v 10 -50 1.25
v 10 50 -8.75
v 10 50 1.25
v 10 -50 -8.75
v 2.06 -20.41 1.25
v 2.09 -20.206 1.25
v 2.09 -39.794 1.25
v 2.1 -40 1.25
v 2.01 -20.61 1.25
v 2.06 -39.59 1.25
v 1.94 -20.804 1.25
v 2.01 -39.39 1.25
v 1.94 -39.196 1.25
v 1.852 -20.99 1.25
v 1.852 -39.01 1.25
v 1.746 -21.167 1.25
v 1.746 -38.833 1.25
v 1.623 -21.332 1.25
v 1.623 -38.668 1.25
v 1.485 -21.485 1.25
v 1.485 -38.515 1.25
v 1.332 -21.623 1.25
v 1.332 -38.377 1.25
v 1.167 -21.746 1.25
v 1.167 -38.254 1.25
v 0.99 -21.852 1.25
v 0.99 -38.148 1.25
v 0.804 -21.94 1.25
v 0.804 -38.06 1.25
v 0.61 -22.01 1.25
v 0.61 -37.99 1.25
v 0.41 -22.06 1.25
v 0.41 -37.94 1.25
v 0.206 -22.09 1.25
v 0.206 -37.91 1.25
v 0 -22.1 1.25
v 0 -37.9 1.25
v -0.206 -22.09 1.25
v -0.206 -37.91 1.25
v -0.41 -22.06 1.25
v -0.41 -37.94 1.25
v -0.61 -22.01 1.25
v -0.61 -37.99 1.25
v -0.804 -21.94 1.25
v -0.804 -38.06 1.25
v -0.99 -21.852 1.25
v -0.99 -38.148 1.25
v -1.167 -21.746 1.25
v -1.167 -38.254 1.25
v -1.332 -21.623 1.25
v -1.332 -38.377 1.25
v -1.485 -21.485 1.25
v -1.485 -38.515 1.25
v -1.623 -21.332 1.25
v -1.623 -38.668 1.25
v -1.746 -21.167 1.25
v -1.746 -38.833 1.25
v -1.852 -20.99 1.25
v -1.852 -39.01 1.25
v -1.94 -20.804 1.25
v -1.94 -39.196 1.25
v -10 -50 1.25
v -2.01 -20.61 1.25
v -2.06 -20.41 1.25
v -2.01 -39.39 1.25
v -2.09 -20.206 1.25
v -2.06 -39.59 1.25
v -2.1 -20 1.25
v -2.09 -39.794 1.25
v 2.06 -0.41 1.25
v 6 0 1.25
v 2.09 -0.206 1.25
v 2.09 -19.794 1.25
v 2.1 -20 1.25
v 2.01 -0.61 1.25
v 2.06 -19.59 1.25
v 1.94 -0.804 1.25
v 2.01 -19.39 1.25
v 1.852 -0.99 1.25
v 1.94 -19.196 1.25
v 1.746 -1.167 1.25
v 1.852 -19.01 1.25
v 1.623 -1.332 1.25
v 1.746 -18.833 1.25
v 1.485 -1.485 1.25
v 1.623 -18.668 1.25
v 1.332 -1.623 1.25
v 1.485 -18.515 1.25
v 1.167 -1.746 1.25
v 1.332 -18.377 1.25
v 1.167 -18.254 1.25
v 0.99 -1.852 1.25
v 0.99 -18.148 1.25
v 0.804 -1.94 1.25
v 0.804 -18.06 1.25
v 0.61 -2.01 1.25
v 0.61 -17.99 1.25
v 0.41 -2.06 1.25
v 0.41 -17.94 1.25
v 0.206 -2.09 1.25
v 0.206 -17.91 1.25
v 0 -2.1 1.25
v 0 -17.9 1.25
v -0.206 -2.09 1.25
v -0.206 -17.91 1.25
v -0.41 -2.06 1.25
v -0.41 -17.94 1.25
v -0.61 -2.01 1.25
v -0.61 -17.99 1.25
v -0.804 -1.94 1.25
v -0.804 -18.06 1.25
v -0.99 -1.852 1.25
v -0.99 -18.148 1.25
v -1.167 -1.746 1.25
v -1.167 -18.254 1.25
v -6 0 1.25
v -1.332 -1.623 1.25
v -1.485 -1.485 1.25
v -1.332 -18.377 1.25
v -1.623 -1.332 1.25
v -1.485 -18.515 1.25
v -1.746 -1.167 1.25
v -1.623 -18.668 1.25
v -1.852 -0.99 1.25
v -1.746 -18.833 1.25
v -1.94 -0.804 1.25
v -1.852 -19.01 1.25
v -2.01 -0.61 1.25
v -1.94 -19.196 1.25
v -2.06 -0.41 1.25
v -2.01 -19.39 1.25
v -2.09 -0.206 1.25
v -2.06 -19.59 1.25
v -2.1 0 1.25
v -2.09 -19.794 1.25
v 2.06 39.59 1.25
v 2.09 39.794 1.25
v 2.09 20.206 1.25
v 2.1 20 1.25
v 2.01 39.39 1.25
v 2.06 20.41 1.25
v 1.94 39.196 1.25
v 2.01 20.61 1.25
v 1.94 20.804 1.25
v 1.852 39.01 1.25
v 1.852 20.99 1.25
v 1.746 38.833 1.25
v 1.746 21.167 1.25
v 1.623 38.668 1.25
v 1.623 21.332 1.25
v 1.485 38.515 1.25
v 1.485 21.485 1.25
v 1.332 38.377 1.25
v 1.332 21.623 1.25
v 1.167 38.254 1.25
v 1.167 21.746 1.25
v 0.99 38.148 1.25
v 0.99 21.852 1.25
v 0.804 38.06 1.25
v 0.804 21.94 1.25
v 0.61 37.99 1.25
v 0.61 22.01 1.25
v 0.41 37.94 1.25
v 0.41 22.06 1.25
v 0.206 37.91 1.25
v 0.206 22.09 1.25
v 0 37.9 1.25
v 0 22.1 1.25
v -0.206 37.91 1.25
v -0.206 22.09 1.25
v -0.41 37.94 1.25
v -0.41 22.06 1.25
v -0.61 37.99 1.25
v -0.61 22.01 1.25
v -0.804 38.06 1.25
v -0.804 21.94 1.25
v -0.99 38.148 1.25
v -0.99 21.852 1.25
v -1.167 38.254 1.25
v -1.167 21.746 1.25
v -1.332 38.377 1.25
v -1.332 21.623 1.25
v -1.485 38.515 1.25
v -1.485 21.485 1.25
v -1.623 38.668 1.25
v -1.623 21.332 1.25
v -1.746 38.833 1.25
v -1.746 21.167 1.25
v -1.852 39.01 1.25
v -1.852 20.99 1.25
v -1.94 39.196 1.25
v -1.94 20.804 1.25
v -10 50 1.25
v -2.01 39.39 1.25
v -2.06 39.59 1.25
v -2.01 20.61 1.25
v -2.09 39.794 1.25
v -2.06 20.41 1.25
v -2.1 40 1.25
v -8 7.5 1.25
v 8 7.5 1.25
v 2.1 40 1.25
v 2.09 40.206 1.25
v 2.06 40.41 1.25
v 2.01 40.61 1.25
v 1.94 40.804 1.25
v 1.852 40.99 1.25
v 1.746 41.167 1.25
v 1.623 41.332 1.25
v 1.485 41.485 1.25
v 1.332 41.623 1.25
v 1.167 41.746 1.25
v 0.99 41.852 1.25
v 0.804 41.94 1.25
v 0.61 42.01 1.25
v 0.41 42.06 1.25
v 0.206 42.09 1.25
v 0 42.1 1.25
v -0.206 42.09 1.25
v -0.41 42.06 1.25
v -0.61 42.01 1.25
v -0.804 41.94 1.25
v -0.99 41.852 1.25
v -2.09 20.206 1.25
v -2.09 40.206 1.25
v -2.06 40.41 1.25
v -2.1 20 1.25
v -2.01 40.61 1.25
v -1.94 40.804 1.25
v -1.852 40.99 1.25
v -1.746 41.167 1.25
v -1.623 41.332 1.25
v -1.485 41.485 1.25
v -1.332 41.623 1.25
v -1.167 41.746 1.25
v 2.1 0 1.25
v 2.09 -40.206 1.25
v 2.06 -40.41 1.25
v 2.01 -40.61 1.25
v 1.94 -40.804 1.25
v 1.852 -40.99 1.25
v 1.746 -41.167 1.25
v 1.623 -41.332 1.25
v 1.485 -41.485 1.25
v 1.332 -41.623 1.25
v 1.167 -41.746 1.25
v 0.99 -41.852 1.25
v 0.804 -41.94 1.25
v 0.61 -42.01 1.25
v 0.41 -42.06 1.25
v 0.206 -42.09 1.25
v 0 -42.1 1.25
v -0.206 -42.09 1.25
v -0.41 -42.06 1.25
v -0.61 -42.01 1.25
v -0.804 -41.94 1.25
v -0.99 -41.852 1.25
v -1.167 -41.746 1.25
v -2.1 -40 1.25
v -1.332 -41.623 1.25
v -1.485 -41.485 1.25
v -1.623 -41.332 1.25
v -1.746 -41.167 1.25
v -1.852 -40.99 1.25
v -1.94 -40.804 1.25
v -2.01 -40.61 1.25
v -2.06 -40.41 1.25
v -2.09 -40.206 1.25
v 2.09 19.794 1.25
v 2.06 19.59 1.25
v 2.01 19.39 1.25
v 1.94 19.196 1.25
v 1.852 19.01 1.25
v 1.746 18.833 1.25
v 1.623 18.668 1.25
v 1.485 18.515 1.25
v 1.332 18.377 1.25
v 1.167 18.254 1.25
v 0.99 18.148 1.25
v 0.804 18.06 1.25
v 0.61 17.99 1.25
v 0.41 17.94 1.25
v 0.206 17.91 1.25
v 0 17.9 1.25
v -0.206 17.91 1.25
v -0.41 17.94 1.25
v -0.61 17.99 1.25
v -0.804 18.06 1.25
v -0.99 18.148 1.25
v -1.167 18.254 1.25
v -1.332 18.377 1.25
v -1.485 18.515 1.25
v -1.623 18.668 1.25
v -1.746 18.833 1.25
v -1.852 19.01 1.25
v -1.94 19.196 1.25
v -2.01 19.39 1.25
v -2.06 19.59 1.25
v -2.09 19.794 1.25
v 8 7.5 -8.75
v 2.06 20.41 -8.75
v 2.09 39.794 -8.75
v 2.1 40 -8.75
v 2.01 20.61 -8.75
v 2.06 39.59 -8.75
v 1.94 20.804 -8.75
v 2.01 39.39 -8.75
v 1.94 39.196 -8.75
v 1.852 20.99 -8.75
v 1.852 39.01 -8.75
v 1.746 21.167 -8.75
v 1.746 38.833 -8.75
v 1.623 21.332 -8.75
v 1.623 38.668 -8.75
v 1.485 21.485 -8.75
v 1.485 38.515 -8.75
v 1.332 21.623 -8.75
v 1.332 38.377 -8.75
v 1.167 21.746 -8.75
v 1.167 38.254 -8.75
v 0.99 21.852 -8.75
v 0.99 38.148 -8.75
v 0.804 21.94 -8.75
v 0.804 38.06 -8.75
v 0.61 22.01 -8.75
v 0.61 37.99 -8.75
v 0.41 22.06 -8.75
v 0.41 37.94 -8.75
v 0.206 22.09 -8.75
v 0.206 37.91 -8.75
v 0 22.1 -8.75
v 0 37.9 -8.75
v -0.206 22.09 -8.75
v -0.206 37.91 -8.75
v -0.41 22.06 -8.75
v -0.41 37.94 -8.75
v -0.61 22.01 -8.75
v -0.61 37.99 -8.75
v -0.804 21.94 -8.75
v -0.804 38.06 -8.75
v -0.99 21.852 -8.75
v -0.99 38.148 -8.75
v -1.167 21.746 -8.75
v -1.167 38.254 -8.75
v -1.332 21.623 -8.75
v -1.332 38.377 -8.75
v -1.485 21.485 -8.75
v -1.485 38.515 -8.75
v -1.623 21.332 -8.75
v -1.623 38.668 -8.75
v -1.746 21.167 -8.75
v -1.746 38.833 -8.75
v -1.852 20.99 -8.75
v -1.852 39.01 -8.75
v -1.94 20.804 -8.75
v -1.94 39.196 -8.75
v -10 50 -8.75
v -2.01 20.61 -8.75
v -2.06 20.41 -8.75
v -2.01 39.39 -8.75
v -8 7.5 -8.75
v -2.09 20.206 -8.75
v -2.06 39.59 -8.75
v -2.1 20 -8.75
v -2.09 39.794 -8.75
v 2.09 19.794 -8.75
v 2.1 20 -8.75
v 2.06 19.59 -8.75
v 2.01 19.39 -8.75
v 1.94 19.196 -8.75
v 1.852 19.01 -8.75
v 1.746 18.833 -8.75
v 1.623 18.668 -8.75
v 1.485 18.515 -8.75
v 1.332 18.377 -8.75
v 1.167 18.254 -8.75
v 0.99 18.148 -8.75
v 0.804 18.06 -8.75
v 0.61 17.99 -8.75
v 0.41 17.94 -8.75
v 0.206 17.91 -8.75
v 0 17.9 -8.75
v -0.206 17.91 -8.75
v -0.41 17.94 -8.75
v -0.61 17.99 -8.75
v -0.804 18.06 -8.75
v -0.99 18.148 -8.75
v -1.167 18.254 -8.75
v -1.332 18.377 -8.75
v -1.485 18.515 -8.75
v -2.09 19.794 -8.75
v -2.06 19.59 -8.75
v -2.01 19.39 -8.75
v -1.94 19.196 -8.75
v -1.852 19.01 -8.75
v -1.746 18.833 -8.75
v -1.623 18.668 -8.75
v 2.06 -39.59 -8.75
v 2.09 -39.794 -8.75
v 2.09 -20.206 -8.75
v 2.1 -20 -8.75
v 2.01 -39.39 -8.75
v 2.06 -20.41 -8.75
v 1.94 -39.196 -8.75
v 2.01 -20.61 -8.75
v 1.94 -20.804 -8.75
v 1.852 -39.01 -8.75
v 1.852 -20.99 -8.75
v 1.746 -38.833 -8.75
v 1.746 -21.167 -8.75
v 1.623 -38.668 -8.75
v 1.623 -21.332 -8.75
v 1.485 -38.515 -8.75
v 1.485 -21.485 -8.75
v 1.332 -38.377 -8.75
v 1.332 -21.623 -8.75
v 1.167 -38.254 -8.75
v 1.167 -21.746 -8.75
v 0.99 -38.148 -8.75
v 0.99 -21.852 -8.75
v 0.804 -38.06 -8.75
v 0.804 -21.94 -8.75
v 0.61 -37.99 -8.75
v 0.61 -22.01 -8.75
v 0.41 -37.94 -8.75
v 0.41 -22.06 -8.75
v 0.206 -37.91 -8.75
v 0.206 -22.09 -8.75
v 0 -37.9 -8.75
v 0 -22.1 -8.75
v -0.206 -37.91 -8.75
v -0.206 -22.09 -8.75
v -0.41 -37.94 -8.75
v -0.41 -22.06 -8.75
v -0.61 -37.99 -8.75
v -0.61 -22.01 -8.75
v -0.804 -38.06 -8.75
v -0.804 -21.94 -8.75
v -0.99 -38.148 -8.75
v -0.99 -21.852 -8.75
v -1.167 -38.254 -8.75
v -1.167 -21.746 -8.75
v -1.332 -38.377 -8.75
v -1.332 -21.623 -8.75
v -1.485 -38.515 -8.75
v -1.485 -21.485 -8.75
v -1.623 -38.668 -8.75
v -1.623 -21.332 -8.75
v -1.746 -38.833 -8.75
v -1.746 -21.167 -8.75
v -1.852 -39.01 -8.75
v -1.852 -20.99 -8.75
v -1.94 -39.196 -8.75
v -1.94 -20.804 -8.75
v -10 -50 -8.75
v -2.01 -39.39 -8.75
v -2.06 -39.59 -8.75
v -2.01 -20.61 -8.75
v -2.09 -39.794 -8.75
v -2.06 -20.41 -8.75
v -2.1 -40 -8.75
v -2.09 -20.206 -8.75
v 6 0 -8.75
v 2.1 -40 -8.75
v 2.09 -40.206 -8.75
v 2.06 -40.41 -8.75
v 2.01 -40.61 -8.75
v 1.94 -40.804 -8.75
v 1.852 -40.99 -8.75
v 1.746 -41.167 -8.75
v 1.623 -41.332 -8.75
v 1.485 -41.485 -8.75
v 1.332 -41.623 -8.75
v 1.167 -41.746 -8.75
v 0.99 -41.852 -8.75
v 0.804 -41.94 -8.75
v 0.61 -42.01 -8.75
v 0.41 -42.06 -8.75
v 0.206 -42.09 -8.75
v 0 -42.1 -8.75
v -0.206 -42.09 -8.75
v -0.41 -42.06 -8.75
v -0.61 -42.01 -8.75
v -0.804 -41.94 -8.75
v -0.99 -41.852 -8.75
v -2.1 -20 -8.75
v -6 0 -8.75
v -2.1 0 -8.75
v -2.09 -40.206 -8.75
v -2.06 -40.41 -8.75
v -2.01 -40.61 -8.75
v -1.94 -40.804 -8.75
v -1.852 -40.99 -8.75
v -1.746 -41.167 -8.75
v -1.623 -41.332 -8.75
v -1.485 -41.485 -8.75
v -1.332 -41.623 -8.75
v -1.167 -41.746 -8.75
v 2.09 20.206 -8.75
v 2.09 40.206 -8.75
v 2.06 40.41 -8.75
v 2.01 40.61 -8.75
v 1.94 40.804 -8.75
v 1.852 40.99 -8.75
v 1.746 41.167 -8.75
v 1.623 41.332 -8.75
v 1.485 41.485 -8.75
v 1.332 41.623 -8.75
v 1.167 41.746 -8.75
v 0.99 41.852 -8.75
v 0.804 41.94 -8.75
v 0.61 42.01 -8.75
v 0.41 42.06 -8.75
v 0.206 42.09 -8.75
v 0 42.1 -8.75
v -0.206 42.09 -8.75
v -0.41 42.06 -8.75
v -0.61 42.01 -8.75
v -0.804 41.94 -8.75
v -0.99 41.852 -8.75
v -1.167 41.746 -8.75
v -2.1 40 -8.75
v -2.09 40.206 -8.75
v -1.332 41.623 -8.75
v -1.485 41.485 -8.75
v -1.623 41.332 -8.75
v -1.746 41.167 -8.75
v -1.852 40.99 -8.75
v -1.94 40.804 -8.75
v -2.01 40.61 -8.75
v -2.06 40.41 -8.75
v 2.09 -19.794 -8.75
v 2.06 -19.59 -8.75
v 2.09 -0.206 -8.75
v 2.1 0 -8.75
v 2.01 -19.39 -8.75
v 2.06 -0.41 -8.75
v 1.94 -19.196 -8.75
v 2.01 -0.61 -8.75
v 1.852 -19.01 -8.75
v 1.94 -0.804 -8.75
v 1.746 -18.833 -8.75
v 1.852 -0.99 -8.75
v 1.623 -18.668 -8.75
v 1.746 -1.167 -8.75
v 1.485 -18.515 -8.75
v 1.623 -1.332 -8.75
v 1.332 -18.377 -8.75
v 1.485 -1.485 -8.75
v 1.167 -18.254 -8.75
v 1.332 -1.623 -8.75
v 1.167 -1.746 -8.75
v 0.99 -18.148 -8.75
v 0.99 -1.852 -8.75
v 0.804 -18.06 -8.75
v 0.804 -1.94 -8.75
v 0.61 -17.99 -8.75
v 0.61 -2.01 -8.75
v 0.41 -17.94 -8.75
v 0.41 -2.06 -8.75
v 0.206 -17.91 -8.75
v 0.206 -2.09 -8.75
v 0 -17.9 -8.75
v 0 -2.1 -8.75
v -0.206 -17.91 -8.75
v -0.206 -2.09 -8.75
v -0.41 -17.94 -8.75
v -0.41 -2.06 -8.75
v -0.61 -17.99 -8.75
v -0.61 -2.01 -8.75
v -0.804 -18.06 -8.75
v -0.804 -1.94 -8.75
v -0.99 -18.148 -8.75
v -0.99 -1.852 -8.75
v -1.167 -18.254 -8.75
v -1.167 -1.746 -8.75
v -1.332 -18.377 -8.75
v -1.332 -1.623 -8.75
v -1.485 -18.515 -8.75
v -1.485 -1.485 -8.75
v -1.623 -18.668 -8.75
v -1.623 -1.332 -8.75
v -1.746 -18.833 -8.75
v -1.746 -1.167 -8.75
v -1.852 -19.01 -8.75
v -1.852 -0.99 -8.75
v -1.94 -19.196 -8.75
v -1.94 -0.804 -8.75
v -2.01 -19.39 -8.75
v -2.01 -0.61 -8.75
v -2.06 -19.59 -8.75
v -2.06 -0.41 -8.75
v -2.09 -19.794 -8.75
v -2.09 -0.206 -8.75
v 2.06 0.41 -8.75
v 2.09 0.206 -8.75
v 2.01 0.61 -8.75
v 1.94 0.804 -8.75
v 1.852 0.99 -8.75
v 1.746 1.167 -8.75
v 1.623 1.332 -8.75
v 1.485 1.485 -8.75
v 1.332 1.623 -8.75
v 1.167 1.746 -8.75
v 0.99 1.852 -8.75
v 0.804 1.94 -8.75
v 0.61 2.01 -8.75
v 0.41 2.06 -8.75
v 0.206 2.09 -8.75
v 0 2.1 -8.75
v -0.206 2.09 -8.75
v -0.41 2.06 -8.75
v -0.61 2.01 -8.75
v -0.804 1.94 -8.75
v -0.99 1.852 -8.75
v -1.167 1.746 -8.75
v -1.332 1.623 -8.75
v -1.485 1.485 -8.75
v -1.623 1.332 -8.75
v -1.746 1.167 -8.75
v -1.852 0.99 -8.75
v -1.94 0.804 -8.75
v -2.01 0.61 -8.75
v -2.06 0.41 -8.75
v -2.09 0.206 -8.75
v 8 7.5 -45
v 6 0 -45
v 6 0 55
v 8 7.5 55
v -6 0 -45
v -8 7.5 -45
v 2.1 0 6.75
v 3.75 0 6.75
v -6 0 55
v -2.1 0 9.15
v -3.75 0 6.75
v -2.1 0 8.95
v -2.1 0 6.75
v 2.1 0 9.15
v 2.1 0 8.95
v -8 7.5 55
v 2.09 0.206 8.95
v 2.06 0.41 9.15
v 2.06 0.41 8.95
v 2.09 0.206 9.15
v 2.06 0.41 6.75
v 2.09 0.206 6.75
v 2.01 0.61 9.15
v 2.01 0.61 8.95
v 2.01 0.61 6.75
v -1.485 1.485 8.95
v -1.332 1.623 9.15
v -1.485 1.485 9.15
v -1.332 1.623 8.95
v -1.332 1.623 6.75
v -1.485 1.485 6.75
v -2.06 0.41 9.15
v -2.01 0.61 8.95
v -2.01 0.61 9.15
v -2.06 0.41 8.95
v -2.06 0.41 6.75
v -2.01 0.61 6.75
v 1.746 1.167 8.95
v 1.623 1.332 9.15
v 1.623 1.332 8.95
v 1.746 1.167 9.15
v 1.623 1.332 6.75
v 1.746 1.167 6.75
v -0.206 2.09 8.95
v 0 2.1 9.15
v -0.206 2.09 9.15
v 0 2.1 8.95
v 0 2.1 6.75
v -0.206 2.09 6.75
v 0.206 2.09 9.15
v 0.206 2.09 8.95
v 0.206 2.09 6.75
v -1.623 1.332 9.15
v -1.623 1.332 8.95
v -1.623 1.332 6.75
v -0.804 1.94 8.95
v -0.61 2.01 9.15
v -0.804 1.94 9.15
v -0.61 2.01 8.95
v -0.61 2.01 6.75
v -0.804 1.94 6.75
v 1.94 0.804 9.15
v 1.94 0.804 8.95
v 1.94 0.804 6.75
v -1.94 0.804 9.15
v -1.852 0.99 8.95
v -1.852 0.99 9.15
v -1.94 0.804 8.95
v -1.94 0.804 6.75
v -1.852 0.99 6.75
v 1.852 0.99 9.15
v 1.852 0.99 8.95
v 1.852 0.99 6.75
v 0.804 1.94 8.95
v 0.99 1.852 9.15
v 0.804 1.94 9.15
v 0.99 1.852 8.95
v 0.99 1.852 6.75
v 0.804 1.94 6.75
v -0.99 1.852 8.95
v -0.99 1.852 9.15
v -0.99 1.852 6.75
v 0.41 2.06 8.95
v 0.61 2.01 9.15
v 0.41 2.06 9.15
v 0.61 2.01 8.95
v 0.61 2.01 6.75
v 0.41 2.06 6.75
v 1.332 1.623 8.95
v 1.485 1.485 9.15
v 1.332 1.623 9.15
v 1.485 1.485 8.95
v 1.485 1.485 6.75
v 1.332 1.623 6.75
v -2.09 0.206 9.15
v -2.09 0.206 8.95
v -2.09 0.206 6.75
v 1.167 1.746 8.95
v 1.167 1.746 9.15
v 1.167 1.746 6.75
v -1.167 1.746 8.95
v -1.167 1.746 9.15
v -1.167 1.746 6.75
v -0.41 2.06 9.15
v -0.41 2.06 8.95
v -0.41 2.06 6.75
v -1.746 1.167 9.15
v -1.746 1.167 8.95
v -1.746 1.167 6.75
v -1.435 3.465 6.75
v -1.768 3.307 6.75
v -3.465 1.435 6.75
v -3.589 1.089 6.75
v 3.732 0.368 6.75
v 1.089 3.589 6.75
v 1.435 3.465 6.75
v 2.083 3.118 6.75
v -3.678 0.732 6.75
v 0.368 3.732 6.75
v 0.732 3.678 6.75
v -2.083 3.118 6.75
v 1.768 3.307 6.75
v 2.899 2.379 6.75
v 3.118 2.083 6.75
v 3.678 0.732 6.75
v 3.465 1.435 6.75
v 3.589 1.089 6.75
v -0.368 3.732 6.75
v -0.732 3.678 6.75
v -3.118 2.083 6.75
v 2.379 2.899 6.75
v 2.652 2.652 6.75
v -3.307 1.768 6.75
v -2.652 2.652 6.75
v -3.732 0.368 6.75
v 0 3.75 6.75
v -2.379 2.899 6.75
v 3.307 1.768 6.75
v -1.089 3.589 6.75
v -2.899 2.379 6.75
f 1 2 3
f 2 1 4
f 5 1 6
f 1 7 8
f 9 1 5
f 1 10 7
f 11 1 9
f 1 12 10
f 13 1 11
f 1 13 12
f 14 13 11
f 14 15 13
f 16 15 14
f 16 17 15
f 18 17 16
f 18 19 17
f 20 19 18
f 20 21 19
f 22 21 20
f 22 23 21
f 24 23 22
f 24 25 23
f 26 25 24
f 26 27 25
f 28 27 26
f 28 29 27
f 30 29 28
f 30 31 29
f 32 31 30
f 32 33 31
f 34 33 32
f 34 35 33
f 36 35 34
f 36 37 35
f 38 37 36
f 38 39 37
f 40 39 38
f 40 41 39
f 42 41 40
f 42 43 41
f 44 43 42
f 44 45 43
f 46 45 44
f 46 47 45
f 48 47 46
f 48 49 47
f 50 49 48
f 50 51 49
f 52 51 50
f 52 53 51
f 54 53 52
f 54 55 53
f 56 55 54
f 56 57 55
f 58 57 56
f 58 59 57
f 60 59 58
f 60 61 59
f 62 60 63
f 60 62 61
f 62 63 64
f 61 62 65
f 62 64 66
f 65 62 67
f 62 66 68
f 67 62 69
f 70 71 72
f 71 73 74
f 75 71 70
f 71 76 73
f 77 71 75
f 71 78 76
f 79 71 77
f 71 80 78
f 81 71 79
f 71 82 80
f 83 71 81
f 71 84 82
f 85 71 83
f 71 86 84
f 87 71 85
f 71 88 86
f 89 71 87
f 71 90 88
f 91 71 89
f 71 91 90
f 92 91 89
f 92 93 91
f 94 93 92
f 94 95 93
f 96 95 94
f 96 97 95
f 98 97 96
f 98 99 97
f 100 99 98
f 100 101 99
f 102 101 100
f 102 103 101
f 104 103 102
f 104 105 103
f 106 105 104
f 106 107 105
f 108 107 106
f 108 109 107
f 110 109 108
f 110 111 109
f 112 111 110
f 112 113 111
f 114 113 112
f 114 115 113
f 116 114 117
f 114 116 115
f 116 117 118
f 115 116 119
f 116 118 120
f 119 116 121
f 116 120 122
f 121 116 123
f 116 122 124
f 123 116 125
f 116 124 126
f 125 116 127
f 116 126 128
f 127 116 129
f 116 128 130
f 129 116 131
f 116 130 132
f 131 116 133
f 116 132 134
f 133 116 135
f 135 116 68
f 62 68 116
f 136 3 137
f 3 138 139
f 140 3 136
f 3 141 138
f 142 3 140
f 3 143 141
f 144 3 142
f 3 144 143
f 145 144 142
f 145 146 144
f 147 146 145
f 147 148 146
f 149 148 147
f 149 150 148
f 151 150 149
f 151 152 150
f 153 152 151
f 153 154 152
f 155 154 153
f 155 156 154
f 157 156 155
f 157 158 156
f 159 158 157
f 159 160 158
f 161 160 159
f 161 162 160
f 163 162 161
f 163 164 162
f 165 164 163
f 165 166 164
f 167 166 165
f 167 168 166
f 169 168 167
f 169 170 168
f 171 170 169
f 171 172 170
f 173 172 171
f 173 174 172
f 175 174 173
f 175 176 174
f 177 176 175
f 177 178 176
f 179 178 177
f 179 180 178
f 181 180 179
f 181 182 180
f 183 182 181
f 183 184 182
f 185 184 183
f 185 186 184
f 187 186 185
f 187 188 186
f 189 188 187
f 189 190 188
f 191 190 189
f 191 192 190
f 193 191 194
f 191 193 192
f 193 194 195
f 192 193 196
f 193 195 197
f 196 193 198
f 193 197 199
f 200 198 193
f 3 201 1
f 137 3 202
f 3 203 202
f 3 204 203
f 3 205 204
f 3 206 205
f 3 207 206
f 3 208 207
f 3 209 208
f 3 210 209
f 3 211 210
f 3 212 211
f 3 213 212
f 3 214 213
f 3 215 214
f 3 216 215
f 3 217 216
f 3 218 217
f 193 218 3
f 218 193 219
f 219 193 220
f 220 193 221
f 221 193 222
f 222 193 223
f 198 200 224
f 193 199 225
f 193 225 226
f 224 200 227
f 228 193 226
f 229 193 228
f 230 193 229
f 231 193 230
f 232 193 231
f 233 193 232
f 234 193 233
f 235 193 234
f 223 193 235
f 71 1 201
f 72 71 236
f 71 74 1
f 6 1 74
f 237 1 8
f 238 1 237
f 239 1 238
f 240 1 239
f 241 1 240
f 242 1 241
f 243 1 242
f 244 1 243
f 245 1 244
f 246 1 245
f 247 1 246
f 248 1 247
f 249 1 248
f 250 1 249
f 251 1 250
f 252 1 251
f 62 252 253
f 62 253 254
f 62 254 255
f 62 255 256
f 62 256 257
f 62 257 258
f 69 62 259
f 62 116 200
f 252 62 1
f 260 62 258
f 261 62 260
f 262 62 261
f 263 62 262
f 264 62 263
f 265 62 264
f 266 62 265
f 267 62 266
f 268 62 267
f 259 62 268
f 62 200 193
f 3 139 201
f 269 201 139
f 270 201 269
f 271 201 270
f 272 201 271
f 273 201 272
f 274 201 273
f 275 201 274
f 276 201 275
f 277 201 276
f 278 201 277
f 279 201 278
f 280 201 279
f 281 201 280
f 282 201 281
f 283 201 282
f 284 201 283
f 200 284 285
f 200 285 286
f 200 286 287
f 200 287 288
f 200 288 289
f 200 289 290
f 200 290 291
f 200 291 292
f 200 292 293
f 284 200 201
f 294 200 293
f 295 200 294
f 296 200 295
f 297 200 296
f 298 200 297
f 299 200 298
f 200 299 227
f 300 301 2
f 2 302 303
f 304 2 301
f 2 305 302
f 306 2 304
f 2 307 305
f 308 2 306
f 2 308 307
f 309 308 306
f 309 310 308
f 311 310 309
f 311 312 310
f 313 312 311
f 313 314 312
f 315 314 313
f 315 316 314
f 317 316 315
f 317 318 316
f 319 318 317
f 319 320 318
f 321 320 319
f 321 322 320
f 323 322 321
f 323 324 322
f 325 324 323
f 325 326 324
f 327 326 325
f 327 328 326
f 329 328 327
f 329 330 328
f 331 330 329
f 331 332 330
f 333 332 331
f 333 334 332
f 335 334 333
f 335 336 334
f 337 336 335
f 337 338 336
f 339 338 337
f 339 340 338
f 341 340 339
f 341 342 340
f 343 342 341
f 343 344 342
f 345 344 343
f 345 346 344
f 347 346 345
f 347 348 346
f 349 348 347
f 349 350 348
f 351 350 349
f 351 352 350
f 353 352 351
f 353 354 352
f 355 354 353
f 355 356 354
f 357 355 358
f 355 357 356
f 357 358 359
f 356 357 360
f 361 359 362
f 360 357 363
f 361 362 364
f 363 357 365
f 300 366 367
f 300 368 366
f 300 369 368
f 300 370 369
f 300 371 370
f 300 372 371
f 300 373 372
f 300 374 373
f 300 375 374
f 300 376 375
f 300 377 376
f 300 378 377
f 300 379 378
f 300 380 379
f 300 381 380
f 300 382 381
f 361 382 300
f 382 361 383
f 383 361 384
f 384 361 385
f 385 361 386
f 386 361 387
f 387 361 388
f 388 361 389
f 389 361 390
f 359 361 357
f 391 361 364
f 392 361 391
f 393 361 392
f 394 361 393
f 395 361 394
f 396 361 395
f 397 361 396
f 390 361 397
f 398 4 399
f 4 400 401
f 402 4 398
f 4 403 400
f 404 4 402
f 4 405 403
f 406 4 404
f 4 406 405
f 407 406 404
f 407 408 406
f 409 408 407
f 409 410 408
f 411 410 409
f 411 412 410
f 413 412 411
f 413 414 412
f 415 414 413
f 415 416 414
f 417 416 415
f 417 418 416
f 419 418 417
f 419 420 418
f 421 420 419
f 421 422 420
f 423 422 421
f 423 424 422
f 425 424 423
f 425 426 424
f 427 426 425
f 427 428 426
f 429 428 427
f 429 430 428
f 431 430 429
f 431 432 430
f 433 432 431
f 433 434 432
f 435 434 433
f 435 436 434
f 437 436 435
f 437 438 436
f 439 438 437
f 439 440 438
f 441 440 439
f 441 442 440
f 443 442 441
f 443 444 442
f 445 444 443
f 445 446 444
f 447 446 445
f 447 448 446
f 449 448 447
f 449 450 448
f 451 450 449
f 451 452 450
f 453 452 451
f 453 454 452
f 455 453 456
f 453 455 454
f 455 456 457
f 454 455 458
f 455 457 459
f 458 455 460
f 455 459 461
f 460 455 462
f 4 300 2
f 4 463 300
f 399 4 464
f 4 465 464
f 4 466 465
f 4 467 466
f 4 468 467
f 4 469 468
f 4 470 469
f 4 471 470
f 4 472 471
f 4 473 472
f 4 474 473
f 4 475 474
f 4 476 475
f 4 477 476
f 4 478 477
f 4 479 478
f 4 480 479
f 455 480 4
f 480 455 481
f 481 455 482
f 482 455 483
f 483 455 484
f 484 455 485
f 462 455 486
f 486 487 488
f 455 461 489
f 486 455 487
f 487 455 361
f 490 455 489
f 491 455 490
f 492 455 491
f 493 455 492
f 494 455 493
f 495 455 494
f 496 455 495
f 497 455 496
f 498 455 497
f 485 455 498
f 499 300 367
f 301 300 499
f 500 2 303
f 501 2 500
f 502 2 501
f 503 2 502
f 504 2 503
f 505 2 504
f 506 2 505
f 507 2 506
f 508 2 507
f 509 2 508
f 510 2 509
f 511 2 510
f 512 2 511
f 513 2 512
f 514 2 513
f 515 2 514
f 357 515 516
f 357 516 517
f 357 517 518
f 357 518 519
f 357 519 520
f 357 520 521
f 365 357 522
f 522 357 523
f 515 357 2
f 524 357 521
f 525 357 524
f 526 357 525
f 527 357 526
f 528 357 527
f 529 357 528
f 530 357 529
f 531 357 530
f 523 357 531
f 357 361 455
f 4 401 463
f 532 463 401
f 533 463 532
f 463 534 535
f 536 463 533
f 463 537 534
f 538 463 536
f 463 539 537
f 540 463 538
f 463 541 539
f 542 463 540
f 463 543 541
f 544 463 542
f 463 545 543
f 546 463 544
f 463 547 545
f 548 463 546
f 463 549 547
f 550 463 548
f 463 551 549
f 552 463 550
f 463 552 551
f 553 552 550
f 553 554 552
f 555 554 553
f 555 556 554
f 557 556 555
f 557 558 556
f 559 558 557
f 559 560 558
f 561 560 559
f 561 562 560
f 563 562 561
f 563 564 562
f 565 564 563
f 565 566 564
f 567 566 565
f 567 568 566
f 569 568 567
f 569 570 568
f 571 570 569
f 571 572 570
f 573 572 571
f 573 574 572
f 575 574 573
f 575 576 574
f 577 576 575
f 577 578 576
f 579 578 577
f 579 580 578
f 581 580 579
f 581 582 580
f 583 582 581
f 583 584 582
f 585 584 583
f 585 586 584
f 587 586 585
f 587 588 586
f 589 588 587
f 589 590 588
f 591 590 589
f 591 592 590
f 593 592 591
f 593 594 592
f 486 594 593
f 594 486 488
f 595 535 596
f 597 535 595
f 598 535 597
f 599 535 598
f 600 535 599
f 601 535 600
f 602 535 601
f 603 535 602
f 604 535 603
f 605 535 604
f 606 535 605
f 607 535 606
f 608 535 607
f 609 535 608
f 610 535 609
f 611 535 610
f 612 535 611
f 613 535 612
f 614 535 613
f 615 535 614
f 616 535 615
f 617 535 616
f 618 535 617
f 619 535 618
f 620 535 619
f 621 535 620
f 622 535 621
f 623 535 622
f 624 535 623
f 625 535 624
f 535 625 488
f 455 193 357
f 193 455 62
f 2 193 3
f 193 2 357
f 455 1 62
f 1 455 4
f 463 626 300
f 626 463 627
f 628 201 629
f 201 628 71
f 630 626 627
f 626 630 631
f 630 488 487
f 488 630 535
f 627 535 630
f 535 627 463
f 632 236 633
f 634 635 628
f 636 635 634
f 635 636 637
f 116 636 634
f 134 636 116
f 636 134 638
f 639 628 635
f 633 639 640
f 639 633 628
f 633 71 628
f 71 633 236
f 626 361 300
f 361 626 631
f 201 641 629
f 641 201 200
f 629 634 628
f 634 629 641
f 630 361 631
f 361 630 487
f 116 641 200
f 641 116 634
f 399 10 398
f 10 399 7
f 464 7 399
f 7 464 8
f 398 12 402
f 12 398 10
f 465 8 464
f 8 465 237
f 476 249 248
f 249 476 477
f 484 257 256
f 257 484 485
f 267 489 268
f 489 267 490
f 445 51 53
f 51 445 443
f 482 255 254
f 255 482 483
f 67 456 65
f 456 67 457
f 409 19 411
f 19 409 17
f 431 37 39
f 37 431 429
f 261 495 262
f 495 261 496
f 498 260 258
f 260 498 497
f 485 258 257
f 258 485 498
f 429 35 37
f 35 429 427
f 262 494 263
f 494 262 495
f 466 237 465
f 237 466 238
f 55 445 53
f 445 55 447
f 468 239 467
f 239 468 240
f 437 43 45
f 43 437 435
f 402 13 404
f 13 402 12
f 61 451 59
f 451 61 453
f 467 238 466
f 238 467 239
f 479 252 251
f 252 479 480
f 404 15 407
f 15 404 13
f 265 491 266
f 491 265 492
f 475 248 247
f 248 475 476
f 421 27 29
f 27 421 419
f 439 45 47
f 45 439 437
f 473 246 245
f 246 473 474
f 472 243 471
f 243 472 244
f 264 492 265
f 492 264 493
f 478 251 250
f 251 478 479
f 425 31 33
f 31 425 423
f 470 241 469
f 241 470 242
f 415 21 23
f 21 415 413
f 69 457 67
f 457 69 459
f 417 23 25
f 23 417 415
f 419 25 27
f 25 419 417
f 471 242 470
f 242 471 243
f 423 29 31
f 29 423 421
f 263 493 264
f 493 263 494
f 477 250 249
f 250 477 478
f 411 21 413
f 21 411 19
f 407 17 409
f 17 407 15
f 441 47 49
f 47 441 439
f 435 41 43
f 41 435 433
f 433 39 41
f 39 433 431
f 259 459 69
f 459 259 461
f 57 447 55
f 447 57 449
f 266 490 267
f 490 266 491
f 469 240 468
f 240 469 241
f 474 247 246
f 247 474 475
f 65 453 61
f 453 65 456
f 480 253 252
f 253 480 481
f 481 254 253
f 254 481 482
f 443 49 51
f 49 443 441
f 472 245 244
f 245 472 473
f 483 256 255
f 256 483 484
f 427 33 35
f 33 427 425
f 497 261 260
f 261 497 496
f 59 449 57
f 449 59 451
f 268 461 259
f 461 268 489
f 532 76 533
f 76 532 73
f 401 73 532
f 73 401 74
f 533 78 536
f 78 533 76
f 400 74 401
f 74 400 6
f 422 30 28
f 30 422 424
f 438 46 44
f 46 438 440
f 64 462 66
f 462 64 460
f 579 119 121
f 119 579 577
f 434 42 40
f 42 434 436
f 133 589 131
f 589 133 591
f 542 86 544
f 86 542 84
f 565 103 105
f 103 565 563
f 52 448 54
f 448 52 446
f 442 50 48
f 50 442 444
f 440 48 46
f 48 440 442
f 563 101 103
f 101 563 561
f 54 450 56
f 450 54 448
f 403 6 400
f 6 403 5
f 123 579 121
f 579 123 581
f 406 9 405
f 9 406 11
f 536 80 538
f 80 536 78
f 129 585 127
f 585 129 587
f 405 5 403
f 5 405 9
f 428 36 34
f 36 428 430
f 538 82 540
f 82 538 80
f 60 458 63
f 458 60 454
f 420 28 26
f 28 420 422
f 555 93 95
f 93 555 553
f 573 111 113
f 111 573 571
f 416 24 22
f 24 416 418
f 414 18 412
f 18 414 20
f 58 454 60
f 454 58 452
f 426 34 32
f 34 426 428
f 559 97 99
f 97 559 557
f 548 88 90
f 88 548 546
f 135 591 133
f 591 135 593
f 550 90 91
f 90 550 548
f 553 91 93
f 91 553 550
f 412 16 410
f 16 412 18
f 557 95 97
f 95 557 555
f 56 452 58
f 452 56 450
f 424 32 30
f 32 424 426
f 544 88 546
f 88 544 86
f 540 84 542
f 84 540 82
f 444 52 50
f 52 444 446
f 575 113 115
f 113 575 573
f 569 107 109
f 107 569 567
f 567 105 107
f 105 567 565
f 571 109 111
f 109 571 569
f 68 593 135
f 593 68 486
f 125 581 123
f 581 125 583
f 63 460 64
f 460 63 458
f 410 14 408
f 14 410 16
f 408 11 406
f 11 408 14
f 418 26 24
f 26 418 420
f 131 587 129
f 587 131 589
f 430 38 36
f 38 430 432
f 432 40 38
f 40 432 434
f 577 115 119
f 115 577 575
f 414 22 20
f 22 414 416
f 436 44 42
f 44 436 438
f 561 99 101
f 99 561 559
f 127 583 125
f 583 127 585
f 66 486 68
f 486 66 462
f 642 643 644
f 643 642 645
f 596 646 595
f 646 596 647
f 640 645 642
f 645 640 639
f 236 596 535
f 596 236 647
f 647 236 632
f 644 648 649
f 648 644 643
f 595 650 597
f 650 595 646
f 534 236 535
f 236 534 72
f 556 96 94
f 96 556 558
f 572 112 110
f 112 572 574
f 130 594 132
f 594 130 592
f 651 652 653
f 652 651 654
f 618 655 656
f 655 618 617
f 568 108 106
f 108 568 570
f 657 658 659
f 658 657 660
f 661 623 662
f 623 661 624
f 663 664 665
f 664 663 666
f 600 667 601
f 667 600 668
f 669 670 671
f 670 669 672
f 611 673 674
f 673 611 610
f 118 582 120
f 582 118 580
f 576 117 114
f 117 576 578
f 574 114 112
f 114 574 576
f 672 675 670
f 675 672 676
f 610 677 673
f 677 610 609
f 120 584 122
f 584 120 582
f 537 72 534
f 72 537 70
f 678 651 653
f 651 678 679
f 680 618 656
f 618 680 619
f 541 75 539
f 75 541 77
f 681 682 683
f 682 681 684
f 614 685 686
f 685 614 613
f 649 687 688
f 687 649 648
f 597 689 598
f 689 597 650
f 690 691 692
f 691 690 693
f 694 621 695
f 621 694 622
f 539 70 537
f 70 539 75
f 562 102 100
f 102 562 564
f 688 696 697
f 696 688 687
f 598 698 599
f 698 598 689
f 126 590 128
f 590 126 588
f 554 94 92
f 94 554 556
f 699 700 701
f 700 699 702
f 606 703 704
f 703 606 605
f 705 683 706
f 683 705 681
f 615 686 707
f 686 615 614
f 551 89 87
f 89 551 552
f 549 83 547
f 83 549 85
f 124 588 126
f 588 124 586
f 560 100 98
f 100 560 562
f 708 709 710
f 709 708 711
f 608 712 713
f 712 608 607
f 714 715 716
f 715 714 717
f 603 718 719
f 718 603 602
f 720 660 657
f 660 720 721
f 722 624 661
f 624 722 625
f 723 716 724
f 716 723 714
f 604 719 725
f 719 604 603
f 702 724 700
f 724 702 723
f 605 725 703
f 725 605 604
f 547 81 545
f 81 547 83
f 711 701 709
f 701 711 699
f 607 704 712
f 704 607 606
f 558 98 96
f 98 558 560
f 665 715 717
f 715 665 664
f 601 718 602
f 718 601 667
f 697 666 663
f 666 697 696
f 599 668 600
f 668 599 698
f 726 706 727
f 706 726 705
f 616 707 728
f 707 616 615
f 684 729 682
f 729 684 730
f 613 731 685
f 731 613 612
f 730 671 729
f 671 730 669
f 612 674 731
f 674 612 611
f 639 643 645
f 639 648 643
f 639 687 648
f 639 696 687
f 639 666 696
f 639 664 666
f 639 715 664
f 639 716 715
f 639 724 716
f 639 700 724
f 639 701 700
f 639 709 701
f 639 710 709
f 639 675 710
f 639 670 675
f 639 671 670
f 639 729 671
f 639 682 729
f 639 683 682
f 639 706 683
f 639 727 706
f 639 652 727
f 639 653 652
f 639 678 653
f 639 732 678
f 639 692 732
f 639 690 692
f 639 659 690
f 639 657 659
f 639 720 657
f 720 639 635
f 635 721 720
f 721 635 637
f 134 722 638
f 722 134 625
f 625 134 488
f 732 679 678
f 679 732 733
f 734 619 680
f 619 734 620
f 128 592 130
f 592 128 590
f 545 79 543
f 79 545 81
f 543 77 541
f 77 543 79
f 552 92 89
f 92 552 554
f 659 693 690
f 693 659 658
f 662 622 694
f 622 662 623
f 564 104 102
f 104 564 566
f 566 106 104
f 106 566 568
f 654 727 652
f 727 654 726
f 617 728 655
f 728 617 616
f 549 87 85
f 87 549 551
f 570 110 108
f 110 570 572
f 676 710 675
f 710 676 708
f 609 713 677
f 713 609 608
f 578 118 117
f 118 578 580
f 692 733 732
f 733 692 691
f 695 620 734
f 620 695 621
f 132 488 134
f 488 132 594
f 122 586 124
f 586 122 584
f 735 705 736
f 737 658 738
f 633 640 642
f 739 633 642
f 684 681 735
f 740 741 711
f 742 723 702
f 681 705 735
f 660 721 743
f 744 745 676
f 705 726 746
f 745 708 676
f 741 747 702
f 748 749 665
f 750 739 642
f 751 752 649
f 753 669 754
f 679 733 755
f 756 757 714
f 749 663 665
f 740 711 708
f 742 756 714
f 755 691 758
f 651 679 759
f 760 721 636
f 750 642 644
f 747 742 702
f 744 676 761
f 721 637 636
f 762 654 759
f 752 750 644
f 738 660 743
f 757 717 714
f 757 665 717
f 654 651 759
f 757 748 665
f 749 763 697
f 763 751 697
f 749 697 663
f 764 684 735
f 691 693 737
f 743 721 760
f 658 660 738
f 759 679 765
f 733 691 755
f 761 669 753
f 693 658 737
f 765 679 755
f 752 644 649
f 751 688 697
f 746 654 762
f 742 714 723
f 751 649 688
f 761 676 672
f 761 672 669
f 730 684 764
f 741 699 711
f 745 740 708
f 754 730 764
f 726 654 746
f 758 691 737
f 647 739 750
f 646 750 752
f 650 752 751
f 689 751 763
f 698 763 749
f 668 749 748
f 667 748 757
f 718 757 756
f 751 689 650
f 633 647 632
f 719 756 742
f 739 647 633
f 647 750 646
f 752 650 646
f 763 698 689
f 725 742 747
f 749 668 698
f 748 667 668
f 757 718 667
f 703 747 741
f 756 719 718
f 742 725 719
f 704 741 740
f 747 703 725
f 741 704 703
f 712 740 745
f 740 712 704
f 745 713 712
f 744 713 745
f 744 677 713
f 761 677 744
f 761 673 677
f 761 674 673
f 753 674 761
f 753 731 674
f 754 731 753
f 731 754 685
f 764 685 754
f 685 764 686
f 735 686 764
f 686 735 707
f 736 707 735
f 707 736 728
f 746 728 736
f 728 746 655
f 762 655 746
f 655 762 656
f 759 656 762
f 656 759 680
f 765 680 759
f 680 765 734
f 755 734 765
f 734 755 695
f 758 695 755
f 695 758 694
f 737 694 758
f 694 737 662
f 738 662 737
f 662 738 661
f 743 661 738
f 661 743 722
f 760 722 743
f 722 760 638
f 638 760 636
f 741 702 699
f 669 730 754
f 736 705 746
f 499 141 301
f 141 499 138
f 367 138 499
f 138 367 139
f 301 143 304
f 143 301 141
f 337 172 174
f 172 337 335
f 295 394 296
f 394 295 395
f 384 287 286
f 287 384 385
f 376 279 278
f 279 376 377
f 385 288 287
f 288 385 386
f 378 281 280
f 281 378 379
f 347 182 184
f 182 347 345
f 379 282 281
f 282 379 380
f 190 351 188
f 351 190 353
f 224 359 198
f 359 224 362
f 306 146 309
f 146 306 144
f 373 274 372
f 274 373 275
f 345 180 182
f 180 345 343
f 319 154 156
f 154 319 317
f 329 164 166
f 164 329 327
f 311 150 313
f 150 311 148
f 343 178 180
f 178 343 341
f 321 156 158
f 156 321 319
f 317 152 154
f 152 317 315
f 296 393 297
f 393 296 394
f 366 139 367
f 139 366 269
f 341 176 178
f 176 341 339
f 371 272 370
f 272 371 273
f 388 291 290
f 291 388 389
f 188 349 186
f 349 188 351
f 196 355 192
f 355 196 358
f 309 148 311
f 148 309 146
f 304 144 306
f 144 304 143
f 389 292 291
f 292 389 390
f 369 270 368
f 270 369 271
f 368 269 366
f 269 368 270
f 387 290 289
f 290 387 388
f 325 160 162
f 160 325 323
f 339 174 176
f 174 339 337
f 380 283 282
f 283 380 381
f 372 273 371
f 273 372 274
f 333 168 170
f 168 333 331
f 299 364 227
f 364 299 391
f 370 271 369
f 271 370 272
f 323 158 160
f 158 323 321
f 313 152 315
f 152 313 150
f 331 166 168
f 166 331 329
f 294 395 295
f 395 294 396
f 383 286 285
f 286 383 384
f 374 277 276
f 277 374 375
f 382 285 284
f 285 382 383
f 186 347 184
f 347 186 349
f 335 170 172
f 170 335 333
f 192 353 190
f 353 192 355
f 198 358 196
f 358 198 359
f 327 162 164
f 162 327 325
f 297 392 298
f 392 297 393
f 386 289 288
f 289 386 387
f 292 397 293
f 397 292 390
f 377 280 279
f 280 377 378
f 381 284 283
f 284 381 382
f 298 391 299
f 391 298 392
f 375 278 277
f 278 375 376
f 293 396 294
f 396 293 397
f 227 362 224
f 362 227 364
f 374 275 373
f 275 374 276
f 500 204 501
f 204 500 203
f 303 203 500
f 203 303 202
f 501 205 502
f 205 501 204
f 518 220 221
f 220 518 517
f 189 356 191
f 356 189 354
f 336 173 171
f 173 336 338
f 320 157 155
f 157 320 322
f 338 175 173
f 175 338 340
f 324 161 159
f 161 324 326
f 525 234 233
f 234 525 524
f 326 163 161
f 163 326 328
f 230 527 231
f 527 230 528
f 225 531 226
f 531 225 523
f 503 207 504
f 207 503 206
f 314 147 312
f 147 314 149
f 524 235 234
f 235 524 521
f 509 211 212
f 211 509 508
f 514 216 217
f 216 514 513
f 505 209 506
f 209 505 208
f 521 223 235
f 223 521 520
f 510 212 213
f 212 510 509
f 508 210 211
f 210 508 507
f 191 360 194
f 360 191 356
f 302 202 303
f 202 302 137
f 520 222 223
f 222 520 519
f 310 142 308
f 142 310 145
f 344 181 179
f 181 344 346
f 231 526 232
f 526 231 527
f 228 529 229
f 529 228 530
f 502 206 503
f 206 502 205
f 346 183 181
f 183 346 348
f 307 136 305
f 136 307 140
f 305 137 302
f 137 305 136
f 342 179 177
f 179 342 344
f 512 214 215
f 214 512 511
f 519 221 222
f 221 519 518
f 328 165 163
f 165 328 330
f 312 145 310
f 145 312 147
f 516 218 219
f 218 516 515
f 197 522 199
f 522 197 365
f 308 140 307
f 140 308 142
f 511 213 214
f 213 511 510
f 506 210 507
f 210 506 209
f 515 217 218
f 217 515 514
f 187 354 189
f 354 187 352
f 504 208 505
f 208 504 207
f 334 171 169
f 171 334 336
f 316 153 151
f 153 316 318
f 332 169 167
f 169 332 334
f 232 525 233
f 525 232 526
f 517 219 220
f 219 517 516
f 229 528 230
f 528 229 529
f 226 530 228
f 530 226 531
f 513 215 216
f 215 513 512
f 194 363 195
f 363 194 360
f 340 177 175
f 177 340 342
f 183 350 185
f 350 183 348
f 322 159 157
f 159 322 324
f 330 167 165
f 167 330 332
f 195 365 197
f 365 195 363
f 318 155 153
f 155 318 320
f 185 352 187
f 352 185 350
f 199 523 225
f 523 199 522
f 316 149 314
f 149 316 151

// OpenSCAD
$fn=64;

rail_w = 20.0;
rail_h = 17.5;
rail_l = 100.0;

base_h = 10.0;
top_h = rail_h - base_h;

top_w = 12.0;
chamfer = 2.0;

hole_d = 4.2;
csk_d = 7.5;
csk_h = 2.0;

hole_count = 5;
end_margin = 10.0;

module rail_profile(len=rail_l){
    union(){
        translate([0,0,-rail_h/2 + base_h/2])
            cube([rail_w, len, base_h], center=true);

        translate([0,0,-rail_h/2 + base_h + top_h/2])
            linear_extrude(height=len, center=true, convexity=10)
                polygon(points=[
                    [-top_w/2, 0],
                    [ top_w/2, 0],
                    [ top_w/2 + chamfer, top_h],
                    [-top_w/2 - chamfer, top_h]
                ]);
    }
}

module mounting_holes(){
    for(i=[0:hole_count-1]){
        y = -rail_l/2 + end_margin + i*((rail_l - 2*end_margin)/(hole_count-1));
        translate([0,y,-rail_h/2])
            cylinder(d=hole_d, h=rail_h+0.4, center=false);

        translate([0,y,rail_h/2 - csk_h])
            cylinder(d1=csk_d, d2=hole_d, h=csk_h+0.2, center=false);
    }
}

difference(){
    rail_profile(rail_l);
    mounting_holes();
}
